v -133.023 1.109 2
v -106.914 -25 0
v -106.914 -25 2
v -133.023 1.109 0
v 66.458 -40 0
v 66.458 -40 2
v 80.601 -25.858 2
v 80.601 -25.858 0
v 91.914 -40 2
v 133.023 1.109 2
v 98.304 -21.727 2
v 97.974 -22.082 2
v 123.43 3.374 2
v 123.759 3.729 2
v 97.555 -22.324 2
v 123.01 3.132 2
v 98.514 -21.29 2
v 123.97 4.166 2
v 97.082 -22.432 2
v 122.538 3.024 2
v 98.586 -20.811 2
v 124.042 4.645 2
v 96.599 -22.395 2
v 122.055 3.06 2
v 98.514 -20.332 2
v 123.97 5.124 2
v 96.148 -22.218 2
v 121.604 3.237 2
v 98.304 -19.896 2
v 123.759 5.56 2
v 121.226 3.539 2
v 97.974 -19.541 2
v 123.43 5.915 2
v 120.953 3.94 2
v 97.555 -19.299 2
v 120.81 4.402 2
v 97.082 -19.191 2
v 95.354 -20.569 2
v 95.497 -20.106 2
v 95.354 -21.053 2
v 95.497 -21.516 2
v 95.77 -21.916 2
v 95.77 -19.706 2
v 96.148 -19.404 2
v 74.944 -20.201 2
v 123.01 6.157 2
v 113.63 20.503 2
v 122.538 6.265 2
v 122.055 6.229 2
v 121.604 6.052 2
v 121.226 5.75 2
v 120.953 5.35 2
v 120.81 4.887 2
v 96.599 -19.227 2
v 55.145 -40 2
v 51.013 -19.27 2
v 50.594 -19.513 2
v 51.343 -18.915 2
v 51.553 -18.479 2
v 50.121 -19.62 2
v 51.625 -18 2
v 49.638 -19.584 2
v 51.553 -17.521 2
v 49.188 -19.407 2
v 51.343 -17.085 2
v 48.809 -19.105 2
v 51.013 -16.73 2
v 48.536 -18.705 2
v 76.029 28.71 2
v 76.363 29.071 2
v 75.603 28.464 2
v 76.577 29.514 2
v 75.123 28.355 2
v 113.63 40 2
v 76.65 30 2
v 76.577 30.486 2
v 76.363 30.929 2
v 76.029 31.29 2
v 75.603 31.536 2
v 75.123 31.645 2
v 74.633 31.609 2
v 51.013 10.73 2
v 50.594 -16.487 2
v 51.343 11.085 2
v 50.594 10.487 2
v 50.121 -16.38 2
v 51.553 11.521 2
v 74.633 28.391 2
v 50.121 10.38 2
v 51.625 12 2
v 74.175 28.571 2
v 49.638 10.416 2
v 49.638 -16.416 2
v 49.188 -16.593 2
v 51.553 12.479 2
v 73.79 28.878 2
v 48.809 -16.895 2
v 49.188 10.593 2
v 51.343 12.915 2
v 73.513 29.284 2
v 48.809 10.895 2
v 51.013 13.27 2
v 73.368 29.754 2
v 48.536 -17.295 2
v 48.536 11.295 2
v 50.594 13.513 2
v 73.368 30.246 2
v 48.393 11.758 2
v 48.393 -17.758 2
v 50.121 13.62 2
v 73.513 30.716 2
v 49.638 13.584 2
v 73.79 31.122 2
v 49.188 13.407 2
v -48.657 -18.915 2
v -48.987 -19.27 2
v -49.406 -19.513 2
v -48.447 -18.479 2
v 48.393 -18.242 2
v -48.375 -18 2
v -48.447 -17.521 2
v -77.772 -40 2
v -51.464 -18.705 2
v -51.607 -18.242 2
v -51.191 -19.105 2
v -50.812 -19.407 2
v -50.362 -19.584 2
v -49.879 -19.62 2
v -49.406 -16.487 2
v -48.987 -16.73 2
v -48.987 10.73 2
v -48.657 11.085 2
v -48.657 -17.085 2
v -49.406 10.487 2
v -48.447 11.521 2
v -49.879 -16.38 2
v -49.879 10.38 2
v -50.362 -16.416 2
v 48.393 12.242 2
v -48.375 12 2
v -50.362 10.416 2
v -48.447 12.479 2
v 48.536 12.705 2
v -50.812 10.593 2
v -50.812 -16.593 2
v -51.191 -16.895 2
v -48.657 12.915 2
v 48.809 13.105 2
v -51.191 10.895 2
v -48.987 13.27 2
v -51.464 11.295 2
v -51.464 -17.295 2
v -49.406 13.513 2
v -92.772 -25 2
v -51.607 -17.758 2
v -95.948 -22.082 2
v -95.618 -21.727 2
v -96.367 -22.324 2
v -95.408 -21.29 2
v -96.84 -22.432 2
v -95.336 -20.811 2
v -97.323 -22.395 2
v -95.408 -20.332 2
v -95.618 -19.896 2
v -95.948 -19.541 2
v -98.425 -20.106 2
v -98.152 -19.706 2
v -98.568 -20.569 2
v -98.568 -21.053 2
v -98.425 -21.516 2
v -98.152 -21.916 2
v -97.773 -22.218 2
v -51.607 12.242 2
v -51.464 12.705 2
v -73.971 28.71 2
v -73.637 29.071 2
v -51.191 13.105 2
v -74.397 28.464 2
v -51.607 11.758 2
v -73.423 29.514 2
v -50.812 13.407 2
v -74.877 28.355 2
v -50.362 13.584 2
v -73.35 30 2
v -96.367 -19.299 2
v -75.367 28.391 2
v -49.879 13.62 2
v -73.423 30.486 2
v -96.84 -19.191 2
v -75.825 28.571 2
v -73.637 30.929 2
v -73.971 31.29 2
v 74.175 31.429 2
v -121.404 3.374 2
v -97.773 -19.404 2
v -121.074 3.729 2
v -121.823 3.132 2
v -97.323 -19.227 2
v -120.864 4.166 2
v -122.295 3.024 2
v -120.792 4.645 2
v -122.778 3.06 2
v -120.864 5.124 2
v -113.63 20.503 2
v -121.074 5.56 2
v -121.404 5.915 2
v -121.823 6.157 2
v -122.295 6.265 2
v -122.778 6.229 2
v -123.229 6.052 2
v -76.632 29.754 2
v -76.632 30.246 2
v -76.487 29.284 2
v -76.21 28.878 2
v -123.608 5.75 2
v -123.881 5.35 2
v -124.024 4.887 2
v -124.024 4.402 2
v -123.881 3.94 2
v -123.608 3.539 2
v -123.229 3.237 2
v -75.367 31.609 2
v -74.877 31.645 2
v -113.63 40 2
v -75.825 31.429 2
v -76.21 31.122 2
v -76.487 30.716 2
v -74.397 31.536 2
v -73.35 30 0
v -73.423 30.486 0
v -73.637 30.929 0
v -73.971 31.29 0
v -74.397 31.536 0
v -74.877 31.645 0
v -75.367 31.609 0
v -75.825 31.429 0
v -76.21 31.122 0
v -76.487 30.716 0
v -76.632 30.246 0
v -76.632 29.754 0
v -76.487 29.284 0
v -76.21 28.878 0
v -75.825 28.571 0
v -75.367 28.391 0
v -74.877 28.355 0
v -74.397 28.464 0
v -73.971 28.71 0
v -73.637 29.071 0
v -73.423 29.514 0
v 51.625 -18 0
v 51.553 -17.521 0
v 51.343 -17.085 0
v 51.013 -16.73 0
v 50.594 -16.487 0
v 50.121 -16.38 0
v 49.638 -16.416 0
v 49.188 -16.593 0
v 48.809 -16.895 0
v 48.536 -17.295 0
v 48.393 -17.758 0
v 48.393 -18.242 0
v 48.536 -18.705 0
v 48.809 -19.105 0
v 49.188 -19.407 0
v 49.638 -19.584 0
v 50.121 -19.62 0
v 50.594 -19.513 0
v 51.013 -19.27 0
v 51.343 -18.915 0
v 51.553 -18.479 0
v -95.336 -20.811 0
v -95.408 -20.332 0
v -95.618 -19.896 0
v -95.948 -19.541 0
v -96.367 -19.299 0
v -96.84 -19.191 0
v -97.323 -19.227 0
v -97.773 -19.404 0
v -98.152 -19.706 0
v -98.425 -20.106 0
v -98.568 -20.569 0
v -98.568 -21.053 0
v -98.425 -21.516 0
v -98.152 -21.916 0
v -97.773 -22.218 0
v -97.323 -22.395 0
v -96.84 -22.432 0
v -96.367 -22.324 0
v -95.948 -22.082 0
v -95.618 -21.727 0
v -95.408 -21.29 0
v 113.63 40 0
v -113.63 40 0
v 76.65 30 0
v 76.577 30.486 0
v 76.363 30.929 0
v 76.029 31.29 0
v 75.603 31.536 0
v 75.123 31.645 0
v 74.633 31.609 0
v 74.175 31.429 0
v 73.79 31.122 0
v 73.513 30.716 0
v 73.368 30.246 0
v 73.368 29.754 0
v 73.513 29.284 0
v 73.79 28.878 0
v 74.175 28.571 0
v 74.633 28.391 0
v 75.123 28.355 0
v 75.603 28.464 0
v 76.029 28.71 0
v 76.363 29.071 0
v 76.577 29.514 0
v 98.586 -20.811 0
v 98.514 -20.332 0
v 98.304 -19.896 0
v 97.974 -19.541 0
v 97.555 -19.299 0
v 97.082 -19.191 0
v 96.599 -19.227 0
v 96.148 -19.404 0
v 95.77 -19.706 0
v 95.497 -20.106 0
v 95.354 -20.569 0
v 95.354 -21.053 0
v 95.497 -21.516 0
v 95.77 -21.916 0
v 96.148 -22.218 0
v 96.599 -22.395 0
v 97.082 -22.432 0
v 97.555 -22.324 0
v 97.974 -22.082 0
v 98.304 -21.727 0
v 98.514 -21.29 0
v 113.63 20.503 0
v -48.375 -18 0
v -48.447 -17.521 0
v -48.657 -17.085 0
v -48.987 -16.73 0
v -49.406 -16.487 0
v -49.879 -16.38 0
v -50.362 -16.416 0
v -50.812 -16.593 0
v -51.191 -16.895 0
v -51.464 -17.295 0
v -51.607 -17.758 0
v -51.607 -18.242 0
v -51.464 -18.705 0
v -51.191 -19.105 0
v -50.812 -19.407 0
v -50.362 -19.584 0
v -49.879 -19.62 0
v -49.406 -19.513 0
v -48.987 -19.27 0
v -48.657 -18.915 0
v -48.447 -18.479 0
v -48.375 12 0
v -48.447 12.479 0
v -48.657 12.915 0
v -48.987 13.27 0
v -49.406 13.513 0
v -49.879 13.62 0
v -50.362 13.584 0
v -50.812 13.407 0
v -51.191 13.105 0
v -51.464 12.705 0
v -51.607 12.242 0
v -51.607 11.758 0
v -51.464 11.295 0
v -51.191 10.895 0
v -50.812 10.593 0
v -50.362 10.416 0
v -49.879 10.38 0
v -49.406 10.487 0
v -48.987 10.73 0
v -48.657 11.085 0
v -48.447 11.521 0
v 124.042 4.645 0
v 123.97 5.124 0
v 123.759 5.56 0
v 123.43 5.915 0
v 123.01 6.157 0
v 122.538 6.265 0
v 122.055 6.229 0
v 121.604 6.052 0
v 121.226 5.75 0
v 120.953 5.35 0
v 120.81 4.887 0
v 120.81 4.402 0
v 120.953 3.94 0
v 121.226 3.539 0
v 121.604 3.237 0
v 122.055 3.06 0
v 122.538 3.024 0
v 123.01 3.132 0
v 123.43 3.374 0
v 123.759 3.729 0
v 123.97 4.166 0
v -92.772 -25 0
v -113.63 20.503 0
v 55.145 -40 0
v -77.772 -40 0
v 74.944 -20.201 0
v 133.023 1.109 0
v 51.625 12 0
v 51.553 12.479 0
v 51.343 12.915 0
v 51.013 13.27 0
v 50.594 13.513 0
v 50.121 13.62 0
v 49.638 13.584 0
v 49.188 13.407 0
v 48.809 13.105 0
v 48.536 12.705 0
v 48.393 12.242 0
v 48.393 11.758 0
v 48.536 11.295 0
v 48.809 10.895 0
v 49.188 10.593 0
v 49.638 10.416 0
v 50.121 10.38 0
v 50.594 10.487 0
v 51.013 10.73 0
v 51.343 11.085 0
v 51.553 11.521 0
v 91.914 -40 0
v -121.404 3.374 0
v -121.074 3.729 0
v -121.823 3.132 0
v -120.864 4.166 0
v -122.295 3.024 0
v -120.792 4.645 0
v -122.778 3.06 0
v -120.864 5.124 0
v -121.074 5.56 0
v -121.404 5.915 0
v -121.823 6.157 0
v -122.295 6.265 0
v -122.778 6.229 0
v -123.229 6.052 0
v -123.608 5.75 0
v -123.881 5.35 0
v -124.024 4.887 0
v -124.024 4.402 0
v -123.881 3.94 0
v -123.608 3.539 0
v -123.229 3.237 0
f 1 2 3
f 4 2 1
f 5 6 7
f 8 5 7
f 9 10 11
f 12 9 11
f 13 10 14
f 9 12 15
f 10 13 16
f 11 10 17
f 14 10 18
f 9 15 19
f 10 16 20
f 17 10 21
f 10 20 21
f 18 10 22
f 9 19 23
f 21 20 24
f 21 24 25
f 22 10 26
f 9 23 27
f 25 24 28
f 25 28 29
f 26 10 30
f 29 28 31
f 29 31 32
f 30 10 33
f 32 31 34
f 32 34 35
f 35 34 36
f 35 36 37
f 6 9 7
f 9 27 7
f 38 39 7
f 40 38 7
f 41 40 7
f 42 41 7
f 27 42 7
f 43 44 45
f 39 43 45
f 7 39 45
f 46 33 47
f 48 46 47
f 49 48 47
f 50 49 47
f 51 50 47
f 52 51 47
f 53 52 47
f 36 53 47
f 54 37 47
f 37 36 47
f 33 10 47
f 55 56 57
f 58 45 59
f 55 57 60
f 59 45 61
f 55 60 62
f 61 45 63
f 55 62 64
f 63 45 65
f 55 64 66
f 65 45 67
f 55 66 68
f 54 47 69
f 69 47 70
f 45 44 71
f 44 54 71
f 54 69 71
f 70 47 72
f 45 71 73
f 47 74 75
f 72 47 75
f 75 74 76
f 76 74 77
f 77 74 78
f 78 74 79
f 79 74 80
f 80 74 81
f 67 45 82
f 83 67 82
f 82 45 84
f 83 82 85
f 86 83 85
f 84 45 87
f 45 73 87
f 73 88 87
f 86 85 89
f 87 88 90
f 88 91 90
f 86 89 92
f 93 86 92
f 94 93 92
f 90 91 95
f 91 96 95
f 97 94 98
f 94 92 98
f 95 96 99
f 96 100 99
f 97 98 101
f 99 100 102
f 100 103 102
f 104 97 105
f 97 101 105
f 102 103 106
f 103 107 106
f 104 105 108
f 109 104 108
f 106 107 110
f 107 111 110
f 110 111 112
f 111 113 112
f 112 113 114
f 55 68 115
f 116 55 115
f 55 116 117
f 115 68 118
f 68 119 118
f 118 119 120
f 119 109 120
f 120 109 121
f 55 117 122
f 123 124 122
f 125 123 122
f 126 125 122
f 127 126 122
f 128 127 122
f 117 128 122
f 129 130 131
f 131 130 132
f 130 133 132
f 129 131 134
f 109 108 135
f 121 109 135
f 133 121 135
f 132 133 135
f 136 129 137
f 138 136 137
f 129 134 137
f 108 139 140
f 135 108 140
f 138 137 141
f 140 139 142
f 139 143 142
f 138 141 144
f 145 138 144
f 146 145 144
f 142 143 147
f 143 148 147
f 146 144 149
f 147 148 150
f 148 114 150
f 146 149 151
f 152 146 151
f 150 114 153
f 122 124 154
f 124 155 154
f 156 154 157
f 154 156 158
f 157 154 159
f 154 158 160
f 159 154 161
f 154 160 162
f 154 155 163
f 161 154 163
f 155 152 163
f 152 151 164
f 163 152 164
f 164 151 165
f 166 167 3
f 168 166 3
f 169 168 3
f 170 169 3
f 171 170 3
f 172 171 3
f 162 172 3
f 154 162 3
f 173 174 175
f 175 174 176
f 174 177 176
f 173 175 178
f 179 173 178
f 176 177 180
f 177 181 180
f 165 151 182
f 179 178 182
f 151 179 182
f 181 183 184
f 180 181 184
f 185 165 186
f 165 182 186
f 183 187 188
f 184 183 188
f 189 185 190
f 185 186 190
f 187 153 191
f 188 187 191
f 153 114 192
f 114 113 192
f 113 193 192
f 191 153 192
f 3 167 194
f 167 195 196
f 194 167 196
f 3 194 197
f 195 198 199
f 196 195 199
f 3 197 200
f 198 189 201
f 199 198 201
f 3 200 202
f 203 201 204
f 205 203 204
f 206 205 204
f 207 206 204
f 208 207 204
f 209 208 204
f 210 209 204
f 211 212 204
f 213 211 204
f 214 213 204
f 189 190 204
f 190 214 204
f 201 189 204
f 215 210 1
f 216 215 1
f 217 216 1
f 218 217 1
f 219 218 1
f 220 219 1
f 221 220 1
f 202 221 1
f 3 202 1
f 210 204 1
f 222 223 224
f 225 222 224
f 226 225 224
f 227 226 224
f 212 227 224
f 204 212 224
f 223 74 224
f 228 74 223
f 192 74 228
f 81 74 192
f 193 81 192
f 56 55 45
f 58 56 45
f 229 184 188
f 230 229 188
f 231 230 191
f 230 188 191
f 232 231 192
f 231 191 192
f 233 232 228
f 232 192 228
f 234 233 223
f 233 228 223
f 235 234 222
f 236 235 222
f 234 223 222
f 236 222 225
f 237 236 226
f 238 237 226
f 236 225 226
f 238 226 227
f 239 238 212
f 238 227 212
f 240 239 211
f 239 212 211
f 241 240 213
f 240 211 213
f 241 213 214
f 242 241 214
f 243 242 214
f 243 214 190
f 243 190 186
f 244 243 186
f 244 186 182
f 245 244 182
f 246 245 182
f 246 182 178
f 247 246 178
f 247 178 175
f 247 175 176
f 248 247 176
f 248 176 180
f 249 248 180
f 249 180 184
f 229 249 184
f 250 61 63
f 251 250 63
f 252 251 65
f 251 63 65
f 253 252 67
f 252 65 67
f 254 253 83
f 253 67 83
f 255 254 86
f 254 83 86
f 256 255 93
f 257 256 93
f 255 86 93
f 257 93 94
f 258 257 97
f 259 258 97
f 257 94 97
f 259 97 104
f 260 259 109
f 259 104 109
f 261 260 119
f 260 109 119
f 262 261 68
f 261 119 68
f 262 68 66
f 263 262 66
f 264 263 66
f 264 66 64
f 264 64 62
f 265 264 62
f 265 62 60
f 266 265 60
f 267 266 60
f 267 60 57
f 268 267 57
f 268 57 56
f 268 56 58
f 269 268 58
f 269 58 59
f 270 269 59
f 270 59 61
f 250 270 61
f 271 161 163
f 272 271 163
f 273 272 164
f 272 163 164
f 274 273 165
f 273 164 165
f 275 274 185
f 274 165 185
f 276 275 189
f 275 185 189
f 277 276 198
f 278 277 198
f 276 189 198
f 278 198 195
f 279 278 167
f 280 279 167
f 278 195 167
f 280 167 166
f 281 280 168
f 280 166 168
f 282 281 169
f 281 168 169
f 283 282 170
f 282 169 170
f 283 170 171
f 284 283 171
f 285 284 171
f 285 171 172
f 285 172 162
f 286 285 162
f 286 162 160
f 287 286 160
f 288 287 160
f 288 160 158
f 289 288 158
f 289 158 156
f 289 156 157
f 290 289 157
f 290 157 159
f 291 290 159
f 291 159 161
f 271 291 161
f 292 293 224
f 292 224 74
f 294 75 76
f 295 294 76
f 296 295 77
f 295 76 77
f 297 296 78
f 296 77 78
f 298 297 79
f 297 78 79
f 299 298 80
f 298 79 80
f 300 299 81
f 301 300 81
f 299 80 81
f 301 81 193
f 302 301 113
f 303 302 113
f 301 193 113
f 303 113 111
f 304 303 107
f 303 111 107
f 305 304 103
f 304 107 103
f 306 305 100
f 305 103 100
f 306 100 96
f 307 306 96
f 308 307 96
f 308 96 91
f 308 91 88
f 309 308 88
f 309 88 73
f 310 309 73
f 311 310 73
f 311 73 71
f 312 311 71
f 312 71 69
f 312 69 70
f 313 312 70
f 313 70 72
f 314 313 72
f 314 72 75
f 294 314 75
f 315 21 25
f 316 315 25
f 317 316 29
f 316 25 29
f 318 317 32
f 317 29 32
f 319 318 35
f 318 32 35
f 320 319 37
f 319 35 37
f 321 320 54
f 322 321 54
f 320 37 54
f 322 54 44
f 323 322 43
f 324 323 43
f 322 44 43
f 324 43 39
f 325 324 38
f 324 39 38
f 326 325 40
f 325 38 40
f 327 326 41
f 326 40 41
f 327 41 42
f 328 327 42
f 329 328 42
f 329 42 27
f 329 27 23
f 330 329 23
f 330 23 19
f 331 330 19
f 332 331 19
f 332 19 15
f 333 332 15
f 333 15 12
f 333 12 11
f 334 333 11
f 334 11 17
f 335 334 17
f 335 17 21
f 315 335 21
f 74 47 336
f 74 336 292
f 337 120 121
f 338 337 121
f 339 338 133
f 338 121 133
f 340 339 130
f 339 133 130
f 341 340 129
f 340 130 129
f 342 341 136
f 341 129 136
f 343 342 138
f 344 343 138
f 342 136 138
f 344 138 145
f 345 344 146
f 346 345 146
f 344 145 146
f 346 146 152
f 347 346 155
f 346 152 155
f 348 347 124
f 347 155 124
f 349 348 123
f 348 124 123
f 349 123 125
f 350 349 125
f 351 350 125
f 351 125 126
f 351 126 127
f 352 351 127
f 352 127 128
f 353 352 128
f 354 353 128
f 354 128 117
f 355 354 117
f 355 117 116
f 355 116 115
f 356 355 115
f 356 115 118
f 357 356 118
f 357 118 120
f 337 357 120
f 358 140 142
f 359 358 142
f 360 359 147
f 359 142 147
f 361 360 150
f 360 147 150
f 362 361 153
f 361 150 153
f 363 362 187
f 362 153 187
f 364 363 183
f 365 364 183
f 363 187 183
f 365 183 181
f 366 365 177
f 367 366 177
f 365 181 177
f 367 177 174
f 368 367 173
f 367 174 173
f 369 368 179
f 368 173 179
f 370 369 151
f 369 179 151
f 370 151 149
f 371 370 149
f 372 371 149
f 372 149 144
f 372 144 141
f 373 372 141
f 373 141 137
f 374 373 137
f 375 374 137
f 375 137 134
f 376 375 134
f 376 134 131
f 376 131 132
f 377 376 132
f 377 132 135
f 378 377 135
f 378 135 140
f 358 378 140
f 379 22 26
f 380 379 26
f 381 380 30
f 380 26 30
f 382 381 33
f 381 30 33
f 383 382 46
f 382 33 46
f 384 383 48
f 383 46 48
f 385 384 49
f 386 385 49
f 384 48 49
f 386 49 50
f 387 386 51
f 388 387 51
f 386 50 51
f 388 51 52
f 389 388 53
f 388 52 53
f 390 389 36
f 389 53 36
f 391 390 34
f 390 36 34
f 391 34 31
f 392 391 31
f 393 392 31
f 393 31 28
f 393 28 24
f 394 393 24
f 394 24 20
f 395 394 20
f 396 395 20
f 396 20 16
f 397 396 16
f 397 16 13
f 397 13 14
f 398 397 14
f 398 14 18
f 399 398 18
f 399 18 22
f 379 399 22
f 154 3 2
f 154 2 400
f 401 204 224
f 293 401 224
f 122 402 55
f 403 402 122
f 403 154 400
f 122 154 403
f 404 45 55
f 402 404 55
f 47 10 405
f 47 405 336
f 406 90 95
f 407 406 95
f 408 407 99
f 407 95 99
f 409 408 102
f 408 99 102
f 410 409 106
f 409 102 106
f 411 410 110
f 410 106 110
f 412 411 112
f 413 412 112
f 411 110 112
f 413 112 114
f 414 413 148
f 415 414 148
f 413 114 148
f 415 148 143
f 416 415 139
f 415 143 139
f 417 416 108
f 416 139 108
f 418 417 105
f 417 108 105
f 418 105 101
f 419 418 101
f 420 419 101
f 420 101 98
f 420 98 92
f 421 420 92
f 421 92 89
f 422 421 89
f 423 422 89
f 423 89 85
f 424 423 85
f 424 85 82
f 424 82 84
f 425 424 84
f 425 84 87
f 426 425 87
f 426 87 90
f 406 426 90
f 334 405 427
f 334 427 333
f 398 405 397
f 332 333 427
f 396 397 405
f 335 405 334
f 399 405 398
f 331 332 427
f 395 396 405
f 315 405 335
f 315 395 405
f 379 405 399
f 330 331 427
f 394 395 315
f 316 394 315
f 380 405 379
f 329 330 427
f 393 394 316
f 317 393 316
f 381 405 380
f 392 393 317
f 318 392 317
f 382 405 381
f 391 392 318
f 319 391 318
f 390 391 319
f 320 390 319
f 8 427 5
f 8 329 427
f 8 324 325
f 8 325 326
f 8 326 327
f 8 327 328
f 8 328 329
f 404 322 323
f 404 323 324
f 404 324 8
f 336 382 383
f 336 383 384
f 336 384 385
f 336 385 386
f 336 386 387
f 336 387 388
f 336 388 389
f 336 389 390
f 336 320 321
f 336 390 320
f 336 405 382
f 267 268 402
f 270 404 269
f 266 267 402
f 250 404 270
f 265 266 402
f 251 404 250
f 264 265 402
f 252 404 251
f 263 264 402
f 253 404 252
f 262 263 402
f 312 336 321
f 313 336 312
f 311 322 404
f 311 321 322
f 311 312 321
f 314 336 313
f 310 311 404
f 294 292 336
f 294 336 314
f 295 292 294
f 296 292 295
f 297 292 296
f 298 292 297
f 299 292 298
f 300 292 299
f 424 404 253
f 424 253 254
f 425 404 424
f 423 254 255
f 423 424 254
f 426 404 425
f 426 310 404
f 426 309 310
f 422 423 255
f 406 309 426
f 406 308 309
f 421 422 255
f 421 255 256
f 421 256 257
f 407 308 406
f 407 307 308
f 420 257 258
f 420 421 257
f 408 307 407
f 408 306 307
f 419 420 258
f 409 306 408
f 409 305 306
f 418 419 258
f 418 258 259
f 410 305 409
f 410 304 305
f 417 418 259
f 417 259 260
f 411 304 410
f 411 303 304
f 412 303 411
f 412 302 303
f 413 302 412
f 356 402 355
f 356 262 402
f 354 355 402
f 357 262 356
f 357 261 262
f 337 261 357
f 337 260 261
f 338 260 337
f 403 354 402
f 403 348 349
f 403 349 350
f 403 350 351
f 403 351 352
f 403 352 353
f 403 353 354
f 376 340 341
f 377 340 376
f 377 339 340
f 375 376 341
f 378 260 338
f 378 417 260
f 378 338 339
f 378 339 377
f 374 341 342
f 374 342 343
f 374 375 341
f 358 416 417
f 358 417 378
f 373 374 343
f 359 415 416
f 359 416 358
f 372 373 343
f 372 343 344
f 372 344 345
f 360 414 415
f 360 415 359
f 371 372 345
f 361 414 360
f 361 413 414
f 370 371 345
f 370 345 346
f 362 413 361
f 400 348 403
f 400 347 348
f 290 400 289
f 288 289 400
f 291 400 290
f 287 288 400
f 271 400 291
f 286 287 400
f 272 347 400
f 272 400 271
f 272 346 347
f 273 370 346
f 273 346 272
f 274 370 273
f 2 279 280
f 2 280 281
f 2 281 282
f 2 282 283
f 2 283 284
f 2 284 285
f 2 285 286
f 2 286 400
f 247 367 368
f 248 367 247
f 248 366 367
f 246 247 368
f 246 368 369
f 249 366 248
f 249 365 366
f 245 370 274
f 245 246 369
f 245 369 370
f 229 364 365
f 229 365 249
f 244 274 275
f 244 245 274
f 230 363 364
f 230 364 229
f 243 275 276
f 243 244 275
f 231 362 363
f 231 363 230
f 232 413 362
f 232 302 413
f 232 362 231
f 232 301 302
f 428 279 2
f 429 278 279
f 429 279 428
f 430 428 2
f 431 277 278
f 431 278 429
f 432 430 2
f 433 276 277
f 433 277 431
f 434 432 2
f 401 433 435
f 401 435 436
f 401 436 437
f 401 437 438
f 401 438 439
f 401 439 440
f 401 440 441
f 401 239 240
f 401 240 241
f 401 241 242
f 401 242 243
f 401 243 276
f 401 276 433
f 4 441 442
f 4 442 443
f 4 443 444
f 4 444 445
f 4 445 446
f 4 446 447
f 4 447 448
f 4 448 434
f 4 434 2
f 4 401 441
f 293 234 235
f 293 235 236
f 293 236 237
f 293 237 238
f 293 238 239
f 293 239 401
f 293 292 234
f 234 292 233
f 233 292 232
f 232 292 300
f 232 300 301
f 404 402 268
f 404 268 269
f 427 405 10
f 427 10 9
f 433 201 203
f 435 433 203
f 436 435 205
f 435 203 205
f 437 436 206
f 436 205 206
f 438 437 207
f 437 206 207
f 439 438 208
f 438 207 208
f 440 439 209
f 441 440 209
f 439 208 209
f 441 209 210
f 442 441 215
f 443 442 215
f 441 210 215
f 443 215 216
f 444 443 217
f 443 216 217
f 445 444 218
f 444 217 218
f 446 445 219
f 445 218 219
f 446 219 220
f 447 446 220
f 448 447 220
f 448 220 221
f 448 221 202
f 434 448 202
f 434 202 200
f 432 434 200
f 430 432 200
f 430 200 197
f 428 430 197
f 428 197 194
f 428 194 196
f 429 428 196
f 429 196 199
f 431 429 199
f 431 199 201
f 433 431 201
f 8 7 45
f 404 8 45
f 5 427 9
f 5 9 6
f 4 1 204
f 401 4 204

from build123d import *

# Parameters (mm, degrees)
SKETCH_1_W          = 127.26
SKETCH_1_H          = 80
EXTRUDE_1_DEPTH     = 2
EXTRUDE_2_DEPTH     = 2
SKETCH_3_R          = 1.625
SKETCH_3_R_2        = 1.65
CUT_EXTRUDE_1_DEPTH = 32


with BuildPart() as part:
    # 草图1 → 凸台-拉伸1 (new body)
    with BuildSketch(Plane.XY):
        Rectangle(SKETCH_1_W, SKETCH_1_H)
    extrude(amount=EXTRUDE_1_DEPTH)

    # 草图2 → 凸台-拉伸2 (add)
    with BuildSketch(Plane(origin=(0, 0, 0), x_dir=(-1, 0, 0), z_dir=(0, 0, -1))):
        Polygon((143.63, 40), (63.63, 40), (63.63, -40), (91.914271247, -40), (157.772135624, 25.857864376), align=None)
        Polygon((-63.63, -40), (-63.63, 40), (-143.63, 40), (-157.772135624, 25.857864376), (-91.914271247, -40), align=None)
    extrude(amount=-EXTRUDE_2_DEPTH)

    # 草图3 → 切除-拉伸1 (cut)
    with BuildSketch(Plane.XY.offset(2)):
        with Locations((-50, 12)):
            Circle(SKETCH_3_R)
        with Locations((-50, -18)):
            Circle(SKETCH_3_R)
        with Locations((50, 12)):
            Circle(SKETCH_3_R)
        with Locations((50, -18)):
            Circle(SKETCH_3_R)
        with Locations((-122.416796564, 4.644660941)):
            Circle(SKETCH_3_R)
        with Locations((-96.960952442, -20.811183182)):
            Circle(SKETCH_3_R)
        with Locations((96.960952442, -20.811183182)):
            Circle(SKETCH_3_R)
        with Locations((122.416796564, 4.644660941)):
            Circle(SKETCH_3_R)
        with Locations((-75, 30)):
            Circle(SKETCH_3_R_2)
        with Locations((75, 30)):
            Circle(SKETCH_3_R_2)
        Polygon((80.600562748, -25.857864376), (74.943708499, -20.201010127), (55.144718626, -40), (66.458427125, -40), align=None)
        Polygon((-106.914271247, -25), (-92.772135624, -25), (-77.772135624, -40), (-106.914271247, -40), align=None)
        Polygon((-133.023398282, 1.109127035), (-113.63, 20.502525317), (-113.63, 40), (-143.63, 40), (-157.772135624, 25.857864376), align=None)
        Polygon((157.772135624, 25.857864376), (133.023398282, 1.109127035), (113.63, 20.502525317), (113.63, 40), (143.63, 40), align=None)
    extrude(amount=-CUT_EXTRUDE_1_DEPTH, mode=Mode.SUBTRACT)


solid = part.part
